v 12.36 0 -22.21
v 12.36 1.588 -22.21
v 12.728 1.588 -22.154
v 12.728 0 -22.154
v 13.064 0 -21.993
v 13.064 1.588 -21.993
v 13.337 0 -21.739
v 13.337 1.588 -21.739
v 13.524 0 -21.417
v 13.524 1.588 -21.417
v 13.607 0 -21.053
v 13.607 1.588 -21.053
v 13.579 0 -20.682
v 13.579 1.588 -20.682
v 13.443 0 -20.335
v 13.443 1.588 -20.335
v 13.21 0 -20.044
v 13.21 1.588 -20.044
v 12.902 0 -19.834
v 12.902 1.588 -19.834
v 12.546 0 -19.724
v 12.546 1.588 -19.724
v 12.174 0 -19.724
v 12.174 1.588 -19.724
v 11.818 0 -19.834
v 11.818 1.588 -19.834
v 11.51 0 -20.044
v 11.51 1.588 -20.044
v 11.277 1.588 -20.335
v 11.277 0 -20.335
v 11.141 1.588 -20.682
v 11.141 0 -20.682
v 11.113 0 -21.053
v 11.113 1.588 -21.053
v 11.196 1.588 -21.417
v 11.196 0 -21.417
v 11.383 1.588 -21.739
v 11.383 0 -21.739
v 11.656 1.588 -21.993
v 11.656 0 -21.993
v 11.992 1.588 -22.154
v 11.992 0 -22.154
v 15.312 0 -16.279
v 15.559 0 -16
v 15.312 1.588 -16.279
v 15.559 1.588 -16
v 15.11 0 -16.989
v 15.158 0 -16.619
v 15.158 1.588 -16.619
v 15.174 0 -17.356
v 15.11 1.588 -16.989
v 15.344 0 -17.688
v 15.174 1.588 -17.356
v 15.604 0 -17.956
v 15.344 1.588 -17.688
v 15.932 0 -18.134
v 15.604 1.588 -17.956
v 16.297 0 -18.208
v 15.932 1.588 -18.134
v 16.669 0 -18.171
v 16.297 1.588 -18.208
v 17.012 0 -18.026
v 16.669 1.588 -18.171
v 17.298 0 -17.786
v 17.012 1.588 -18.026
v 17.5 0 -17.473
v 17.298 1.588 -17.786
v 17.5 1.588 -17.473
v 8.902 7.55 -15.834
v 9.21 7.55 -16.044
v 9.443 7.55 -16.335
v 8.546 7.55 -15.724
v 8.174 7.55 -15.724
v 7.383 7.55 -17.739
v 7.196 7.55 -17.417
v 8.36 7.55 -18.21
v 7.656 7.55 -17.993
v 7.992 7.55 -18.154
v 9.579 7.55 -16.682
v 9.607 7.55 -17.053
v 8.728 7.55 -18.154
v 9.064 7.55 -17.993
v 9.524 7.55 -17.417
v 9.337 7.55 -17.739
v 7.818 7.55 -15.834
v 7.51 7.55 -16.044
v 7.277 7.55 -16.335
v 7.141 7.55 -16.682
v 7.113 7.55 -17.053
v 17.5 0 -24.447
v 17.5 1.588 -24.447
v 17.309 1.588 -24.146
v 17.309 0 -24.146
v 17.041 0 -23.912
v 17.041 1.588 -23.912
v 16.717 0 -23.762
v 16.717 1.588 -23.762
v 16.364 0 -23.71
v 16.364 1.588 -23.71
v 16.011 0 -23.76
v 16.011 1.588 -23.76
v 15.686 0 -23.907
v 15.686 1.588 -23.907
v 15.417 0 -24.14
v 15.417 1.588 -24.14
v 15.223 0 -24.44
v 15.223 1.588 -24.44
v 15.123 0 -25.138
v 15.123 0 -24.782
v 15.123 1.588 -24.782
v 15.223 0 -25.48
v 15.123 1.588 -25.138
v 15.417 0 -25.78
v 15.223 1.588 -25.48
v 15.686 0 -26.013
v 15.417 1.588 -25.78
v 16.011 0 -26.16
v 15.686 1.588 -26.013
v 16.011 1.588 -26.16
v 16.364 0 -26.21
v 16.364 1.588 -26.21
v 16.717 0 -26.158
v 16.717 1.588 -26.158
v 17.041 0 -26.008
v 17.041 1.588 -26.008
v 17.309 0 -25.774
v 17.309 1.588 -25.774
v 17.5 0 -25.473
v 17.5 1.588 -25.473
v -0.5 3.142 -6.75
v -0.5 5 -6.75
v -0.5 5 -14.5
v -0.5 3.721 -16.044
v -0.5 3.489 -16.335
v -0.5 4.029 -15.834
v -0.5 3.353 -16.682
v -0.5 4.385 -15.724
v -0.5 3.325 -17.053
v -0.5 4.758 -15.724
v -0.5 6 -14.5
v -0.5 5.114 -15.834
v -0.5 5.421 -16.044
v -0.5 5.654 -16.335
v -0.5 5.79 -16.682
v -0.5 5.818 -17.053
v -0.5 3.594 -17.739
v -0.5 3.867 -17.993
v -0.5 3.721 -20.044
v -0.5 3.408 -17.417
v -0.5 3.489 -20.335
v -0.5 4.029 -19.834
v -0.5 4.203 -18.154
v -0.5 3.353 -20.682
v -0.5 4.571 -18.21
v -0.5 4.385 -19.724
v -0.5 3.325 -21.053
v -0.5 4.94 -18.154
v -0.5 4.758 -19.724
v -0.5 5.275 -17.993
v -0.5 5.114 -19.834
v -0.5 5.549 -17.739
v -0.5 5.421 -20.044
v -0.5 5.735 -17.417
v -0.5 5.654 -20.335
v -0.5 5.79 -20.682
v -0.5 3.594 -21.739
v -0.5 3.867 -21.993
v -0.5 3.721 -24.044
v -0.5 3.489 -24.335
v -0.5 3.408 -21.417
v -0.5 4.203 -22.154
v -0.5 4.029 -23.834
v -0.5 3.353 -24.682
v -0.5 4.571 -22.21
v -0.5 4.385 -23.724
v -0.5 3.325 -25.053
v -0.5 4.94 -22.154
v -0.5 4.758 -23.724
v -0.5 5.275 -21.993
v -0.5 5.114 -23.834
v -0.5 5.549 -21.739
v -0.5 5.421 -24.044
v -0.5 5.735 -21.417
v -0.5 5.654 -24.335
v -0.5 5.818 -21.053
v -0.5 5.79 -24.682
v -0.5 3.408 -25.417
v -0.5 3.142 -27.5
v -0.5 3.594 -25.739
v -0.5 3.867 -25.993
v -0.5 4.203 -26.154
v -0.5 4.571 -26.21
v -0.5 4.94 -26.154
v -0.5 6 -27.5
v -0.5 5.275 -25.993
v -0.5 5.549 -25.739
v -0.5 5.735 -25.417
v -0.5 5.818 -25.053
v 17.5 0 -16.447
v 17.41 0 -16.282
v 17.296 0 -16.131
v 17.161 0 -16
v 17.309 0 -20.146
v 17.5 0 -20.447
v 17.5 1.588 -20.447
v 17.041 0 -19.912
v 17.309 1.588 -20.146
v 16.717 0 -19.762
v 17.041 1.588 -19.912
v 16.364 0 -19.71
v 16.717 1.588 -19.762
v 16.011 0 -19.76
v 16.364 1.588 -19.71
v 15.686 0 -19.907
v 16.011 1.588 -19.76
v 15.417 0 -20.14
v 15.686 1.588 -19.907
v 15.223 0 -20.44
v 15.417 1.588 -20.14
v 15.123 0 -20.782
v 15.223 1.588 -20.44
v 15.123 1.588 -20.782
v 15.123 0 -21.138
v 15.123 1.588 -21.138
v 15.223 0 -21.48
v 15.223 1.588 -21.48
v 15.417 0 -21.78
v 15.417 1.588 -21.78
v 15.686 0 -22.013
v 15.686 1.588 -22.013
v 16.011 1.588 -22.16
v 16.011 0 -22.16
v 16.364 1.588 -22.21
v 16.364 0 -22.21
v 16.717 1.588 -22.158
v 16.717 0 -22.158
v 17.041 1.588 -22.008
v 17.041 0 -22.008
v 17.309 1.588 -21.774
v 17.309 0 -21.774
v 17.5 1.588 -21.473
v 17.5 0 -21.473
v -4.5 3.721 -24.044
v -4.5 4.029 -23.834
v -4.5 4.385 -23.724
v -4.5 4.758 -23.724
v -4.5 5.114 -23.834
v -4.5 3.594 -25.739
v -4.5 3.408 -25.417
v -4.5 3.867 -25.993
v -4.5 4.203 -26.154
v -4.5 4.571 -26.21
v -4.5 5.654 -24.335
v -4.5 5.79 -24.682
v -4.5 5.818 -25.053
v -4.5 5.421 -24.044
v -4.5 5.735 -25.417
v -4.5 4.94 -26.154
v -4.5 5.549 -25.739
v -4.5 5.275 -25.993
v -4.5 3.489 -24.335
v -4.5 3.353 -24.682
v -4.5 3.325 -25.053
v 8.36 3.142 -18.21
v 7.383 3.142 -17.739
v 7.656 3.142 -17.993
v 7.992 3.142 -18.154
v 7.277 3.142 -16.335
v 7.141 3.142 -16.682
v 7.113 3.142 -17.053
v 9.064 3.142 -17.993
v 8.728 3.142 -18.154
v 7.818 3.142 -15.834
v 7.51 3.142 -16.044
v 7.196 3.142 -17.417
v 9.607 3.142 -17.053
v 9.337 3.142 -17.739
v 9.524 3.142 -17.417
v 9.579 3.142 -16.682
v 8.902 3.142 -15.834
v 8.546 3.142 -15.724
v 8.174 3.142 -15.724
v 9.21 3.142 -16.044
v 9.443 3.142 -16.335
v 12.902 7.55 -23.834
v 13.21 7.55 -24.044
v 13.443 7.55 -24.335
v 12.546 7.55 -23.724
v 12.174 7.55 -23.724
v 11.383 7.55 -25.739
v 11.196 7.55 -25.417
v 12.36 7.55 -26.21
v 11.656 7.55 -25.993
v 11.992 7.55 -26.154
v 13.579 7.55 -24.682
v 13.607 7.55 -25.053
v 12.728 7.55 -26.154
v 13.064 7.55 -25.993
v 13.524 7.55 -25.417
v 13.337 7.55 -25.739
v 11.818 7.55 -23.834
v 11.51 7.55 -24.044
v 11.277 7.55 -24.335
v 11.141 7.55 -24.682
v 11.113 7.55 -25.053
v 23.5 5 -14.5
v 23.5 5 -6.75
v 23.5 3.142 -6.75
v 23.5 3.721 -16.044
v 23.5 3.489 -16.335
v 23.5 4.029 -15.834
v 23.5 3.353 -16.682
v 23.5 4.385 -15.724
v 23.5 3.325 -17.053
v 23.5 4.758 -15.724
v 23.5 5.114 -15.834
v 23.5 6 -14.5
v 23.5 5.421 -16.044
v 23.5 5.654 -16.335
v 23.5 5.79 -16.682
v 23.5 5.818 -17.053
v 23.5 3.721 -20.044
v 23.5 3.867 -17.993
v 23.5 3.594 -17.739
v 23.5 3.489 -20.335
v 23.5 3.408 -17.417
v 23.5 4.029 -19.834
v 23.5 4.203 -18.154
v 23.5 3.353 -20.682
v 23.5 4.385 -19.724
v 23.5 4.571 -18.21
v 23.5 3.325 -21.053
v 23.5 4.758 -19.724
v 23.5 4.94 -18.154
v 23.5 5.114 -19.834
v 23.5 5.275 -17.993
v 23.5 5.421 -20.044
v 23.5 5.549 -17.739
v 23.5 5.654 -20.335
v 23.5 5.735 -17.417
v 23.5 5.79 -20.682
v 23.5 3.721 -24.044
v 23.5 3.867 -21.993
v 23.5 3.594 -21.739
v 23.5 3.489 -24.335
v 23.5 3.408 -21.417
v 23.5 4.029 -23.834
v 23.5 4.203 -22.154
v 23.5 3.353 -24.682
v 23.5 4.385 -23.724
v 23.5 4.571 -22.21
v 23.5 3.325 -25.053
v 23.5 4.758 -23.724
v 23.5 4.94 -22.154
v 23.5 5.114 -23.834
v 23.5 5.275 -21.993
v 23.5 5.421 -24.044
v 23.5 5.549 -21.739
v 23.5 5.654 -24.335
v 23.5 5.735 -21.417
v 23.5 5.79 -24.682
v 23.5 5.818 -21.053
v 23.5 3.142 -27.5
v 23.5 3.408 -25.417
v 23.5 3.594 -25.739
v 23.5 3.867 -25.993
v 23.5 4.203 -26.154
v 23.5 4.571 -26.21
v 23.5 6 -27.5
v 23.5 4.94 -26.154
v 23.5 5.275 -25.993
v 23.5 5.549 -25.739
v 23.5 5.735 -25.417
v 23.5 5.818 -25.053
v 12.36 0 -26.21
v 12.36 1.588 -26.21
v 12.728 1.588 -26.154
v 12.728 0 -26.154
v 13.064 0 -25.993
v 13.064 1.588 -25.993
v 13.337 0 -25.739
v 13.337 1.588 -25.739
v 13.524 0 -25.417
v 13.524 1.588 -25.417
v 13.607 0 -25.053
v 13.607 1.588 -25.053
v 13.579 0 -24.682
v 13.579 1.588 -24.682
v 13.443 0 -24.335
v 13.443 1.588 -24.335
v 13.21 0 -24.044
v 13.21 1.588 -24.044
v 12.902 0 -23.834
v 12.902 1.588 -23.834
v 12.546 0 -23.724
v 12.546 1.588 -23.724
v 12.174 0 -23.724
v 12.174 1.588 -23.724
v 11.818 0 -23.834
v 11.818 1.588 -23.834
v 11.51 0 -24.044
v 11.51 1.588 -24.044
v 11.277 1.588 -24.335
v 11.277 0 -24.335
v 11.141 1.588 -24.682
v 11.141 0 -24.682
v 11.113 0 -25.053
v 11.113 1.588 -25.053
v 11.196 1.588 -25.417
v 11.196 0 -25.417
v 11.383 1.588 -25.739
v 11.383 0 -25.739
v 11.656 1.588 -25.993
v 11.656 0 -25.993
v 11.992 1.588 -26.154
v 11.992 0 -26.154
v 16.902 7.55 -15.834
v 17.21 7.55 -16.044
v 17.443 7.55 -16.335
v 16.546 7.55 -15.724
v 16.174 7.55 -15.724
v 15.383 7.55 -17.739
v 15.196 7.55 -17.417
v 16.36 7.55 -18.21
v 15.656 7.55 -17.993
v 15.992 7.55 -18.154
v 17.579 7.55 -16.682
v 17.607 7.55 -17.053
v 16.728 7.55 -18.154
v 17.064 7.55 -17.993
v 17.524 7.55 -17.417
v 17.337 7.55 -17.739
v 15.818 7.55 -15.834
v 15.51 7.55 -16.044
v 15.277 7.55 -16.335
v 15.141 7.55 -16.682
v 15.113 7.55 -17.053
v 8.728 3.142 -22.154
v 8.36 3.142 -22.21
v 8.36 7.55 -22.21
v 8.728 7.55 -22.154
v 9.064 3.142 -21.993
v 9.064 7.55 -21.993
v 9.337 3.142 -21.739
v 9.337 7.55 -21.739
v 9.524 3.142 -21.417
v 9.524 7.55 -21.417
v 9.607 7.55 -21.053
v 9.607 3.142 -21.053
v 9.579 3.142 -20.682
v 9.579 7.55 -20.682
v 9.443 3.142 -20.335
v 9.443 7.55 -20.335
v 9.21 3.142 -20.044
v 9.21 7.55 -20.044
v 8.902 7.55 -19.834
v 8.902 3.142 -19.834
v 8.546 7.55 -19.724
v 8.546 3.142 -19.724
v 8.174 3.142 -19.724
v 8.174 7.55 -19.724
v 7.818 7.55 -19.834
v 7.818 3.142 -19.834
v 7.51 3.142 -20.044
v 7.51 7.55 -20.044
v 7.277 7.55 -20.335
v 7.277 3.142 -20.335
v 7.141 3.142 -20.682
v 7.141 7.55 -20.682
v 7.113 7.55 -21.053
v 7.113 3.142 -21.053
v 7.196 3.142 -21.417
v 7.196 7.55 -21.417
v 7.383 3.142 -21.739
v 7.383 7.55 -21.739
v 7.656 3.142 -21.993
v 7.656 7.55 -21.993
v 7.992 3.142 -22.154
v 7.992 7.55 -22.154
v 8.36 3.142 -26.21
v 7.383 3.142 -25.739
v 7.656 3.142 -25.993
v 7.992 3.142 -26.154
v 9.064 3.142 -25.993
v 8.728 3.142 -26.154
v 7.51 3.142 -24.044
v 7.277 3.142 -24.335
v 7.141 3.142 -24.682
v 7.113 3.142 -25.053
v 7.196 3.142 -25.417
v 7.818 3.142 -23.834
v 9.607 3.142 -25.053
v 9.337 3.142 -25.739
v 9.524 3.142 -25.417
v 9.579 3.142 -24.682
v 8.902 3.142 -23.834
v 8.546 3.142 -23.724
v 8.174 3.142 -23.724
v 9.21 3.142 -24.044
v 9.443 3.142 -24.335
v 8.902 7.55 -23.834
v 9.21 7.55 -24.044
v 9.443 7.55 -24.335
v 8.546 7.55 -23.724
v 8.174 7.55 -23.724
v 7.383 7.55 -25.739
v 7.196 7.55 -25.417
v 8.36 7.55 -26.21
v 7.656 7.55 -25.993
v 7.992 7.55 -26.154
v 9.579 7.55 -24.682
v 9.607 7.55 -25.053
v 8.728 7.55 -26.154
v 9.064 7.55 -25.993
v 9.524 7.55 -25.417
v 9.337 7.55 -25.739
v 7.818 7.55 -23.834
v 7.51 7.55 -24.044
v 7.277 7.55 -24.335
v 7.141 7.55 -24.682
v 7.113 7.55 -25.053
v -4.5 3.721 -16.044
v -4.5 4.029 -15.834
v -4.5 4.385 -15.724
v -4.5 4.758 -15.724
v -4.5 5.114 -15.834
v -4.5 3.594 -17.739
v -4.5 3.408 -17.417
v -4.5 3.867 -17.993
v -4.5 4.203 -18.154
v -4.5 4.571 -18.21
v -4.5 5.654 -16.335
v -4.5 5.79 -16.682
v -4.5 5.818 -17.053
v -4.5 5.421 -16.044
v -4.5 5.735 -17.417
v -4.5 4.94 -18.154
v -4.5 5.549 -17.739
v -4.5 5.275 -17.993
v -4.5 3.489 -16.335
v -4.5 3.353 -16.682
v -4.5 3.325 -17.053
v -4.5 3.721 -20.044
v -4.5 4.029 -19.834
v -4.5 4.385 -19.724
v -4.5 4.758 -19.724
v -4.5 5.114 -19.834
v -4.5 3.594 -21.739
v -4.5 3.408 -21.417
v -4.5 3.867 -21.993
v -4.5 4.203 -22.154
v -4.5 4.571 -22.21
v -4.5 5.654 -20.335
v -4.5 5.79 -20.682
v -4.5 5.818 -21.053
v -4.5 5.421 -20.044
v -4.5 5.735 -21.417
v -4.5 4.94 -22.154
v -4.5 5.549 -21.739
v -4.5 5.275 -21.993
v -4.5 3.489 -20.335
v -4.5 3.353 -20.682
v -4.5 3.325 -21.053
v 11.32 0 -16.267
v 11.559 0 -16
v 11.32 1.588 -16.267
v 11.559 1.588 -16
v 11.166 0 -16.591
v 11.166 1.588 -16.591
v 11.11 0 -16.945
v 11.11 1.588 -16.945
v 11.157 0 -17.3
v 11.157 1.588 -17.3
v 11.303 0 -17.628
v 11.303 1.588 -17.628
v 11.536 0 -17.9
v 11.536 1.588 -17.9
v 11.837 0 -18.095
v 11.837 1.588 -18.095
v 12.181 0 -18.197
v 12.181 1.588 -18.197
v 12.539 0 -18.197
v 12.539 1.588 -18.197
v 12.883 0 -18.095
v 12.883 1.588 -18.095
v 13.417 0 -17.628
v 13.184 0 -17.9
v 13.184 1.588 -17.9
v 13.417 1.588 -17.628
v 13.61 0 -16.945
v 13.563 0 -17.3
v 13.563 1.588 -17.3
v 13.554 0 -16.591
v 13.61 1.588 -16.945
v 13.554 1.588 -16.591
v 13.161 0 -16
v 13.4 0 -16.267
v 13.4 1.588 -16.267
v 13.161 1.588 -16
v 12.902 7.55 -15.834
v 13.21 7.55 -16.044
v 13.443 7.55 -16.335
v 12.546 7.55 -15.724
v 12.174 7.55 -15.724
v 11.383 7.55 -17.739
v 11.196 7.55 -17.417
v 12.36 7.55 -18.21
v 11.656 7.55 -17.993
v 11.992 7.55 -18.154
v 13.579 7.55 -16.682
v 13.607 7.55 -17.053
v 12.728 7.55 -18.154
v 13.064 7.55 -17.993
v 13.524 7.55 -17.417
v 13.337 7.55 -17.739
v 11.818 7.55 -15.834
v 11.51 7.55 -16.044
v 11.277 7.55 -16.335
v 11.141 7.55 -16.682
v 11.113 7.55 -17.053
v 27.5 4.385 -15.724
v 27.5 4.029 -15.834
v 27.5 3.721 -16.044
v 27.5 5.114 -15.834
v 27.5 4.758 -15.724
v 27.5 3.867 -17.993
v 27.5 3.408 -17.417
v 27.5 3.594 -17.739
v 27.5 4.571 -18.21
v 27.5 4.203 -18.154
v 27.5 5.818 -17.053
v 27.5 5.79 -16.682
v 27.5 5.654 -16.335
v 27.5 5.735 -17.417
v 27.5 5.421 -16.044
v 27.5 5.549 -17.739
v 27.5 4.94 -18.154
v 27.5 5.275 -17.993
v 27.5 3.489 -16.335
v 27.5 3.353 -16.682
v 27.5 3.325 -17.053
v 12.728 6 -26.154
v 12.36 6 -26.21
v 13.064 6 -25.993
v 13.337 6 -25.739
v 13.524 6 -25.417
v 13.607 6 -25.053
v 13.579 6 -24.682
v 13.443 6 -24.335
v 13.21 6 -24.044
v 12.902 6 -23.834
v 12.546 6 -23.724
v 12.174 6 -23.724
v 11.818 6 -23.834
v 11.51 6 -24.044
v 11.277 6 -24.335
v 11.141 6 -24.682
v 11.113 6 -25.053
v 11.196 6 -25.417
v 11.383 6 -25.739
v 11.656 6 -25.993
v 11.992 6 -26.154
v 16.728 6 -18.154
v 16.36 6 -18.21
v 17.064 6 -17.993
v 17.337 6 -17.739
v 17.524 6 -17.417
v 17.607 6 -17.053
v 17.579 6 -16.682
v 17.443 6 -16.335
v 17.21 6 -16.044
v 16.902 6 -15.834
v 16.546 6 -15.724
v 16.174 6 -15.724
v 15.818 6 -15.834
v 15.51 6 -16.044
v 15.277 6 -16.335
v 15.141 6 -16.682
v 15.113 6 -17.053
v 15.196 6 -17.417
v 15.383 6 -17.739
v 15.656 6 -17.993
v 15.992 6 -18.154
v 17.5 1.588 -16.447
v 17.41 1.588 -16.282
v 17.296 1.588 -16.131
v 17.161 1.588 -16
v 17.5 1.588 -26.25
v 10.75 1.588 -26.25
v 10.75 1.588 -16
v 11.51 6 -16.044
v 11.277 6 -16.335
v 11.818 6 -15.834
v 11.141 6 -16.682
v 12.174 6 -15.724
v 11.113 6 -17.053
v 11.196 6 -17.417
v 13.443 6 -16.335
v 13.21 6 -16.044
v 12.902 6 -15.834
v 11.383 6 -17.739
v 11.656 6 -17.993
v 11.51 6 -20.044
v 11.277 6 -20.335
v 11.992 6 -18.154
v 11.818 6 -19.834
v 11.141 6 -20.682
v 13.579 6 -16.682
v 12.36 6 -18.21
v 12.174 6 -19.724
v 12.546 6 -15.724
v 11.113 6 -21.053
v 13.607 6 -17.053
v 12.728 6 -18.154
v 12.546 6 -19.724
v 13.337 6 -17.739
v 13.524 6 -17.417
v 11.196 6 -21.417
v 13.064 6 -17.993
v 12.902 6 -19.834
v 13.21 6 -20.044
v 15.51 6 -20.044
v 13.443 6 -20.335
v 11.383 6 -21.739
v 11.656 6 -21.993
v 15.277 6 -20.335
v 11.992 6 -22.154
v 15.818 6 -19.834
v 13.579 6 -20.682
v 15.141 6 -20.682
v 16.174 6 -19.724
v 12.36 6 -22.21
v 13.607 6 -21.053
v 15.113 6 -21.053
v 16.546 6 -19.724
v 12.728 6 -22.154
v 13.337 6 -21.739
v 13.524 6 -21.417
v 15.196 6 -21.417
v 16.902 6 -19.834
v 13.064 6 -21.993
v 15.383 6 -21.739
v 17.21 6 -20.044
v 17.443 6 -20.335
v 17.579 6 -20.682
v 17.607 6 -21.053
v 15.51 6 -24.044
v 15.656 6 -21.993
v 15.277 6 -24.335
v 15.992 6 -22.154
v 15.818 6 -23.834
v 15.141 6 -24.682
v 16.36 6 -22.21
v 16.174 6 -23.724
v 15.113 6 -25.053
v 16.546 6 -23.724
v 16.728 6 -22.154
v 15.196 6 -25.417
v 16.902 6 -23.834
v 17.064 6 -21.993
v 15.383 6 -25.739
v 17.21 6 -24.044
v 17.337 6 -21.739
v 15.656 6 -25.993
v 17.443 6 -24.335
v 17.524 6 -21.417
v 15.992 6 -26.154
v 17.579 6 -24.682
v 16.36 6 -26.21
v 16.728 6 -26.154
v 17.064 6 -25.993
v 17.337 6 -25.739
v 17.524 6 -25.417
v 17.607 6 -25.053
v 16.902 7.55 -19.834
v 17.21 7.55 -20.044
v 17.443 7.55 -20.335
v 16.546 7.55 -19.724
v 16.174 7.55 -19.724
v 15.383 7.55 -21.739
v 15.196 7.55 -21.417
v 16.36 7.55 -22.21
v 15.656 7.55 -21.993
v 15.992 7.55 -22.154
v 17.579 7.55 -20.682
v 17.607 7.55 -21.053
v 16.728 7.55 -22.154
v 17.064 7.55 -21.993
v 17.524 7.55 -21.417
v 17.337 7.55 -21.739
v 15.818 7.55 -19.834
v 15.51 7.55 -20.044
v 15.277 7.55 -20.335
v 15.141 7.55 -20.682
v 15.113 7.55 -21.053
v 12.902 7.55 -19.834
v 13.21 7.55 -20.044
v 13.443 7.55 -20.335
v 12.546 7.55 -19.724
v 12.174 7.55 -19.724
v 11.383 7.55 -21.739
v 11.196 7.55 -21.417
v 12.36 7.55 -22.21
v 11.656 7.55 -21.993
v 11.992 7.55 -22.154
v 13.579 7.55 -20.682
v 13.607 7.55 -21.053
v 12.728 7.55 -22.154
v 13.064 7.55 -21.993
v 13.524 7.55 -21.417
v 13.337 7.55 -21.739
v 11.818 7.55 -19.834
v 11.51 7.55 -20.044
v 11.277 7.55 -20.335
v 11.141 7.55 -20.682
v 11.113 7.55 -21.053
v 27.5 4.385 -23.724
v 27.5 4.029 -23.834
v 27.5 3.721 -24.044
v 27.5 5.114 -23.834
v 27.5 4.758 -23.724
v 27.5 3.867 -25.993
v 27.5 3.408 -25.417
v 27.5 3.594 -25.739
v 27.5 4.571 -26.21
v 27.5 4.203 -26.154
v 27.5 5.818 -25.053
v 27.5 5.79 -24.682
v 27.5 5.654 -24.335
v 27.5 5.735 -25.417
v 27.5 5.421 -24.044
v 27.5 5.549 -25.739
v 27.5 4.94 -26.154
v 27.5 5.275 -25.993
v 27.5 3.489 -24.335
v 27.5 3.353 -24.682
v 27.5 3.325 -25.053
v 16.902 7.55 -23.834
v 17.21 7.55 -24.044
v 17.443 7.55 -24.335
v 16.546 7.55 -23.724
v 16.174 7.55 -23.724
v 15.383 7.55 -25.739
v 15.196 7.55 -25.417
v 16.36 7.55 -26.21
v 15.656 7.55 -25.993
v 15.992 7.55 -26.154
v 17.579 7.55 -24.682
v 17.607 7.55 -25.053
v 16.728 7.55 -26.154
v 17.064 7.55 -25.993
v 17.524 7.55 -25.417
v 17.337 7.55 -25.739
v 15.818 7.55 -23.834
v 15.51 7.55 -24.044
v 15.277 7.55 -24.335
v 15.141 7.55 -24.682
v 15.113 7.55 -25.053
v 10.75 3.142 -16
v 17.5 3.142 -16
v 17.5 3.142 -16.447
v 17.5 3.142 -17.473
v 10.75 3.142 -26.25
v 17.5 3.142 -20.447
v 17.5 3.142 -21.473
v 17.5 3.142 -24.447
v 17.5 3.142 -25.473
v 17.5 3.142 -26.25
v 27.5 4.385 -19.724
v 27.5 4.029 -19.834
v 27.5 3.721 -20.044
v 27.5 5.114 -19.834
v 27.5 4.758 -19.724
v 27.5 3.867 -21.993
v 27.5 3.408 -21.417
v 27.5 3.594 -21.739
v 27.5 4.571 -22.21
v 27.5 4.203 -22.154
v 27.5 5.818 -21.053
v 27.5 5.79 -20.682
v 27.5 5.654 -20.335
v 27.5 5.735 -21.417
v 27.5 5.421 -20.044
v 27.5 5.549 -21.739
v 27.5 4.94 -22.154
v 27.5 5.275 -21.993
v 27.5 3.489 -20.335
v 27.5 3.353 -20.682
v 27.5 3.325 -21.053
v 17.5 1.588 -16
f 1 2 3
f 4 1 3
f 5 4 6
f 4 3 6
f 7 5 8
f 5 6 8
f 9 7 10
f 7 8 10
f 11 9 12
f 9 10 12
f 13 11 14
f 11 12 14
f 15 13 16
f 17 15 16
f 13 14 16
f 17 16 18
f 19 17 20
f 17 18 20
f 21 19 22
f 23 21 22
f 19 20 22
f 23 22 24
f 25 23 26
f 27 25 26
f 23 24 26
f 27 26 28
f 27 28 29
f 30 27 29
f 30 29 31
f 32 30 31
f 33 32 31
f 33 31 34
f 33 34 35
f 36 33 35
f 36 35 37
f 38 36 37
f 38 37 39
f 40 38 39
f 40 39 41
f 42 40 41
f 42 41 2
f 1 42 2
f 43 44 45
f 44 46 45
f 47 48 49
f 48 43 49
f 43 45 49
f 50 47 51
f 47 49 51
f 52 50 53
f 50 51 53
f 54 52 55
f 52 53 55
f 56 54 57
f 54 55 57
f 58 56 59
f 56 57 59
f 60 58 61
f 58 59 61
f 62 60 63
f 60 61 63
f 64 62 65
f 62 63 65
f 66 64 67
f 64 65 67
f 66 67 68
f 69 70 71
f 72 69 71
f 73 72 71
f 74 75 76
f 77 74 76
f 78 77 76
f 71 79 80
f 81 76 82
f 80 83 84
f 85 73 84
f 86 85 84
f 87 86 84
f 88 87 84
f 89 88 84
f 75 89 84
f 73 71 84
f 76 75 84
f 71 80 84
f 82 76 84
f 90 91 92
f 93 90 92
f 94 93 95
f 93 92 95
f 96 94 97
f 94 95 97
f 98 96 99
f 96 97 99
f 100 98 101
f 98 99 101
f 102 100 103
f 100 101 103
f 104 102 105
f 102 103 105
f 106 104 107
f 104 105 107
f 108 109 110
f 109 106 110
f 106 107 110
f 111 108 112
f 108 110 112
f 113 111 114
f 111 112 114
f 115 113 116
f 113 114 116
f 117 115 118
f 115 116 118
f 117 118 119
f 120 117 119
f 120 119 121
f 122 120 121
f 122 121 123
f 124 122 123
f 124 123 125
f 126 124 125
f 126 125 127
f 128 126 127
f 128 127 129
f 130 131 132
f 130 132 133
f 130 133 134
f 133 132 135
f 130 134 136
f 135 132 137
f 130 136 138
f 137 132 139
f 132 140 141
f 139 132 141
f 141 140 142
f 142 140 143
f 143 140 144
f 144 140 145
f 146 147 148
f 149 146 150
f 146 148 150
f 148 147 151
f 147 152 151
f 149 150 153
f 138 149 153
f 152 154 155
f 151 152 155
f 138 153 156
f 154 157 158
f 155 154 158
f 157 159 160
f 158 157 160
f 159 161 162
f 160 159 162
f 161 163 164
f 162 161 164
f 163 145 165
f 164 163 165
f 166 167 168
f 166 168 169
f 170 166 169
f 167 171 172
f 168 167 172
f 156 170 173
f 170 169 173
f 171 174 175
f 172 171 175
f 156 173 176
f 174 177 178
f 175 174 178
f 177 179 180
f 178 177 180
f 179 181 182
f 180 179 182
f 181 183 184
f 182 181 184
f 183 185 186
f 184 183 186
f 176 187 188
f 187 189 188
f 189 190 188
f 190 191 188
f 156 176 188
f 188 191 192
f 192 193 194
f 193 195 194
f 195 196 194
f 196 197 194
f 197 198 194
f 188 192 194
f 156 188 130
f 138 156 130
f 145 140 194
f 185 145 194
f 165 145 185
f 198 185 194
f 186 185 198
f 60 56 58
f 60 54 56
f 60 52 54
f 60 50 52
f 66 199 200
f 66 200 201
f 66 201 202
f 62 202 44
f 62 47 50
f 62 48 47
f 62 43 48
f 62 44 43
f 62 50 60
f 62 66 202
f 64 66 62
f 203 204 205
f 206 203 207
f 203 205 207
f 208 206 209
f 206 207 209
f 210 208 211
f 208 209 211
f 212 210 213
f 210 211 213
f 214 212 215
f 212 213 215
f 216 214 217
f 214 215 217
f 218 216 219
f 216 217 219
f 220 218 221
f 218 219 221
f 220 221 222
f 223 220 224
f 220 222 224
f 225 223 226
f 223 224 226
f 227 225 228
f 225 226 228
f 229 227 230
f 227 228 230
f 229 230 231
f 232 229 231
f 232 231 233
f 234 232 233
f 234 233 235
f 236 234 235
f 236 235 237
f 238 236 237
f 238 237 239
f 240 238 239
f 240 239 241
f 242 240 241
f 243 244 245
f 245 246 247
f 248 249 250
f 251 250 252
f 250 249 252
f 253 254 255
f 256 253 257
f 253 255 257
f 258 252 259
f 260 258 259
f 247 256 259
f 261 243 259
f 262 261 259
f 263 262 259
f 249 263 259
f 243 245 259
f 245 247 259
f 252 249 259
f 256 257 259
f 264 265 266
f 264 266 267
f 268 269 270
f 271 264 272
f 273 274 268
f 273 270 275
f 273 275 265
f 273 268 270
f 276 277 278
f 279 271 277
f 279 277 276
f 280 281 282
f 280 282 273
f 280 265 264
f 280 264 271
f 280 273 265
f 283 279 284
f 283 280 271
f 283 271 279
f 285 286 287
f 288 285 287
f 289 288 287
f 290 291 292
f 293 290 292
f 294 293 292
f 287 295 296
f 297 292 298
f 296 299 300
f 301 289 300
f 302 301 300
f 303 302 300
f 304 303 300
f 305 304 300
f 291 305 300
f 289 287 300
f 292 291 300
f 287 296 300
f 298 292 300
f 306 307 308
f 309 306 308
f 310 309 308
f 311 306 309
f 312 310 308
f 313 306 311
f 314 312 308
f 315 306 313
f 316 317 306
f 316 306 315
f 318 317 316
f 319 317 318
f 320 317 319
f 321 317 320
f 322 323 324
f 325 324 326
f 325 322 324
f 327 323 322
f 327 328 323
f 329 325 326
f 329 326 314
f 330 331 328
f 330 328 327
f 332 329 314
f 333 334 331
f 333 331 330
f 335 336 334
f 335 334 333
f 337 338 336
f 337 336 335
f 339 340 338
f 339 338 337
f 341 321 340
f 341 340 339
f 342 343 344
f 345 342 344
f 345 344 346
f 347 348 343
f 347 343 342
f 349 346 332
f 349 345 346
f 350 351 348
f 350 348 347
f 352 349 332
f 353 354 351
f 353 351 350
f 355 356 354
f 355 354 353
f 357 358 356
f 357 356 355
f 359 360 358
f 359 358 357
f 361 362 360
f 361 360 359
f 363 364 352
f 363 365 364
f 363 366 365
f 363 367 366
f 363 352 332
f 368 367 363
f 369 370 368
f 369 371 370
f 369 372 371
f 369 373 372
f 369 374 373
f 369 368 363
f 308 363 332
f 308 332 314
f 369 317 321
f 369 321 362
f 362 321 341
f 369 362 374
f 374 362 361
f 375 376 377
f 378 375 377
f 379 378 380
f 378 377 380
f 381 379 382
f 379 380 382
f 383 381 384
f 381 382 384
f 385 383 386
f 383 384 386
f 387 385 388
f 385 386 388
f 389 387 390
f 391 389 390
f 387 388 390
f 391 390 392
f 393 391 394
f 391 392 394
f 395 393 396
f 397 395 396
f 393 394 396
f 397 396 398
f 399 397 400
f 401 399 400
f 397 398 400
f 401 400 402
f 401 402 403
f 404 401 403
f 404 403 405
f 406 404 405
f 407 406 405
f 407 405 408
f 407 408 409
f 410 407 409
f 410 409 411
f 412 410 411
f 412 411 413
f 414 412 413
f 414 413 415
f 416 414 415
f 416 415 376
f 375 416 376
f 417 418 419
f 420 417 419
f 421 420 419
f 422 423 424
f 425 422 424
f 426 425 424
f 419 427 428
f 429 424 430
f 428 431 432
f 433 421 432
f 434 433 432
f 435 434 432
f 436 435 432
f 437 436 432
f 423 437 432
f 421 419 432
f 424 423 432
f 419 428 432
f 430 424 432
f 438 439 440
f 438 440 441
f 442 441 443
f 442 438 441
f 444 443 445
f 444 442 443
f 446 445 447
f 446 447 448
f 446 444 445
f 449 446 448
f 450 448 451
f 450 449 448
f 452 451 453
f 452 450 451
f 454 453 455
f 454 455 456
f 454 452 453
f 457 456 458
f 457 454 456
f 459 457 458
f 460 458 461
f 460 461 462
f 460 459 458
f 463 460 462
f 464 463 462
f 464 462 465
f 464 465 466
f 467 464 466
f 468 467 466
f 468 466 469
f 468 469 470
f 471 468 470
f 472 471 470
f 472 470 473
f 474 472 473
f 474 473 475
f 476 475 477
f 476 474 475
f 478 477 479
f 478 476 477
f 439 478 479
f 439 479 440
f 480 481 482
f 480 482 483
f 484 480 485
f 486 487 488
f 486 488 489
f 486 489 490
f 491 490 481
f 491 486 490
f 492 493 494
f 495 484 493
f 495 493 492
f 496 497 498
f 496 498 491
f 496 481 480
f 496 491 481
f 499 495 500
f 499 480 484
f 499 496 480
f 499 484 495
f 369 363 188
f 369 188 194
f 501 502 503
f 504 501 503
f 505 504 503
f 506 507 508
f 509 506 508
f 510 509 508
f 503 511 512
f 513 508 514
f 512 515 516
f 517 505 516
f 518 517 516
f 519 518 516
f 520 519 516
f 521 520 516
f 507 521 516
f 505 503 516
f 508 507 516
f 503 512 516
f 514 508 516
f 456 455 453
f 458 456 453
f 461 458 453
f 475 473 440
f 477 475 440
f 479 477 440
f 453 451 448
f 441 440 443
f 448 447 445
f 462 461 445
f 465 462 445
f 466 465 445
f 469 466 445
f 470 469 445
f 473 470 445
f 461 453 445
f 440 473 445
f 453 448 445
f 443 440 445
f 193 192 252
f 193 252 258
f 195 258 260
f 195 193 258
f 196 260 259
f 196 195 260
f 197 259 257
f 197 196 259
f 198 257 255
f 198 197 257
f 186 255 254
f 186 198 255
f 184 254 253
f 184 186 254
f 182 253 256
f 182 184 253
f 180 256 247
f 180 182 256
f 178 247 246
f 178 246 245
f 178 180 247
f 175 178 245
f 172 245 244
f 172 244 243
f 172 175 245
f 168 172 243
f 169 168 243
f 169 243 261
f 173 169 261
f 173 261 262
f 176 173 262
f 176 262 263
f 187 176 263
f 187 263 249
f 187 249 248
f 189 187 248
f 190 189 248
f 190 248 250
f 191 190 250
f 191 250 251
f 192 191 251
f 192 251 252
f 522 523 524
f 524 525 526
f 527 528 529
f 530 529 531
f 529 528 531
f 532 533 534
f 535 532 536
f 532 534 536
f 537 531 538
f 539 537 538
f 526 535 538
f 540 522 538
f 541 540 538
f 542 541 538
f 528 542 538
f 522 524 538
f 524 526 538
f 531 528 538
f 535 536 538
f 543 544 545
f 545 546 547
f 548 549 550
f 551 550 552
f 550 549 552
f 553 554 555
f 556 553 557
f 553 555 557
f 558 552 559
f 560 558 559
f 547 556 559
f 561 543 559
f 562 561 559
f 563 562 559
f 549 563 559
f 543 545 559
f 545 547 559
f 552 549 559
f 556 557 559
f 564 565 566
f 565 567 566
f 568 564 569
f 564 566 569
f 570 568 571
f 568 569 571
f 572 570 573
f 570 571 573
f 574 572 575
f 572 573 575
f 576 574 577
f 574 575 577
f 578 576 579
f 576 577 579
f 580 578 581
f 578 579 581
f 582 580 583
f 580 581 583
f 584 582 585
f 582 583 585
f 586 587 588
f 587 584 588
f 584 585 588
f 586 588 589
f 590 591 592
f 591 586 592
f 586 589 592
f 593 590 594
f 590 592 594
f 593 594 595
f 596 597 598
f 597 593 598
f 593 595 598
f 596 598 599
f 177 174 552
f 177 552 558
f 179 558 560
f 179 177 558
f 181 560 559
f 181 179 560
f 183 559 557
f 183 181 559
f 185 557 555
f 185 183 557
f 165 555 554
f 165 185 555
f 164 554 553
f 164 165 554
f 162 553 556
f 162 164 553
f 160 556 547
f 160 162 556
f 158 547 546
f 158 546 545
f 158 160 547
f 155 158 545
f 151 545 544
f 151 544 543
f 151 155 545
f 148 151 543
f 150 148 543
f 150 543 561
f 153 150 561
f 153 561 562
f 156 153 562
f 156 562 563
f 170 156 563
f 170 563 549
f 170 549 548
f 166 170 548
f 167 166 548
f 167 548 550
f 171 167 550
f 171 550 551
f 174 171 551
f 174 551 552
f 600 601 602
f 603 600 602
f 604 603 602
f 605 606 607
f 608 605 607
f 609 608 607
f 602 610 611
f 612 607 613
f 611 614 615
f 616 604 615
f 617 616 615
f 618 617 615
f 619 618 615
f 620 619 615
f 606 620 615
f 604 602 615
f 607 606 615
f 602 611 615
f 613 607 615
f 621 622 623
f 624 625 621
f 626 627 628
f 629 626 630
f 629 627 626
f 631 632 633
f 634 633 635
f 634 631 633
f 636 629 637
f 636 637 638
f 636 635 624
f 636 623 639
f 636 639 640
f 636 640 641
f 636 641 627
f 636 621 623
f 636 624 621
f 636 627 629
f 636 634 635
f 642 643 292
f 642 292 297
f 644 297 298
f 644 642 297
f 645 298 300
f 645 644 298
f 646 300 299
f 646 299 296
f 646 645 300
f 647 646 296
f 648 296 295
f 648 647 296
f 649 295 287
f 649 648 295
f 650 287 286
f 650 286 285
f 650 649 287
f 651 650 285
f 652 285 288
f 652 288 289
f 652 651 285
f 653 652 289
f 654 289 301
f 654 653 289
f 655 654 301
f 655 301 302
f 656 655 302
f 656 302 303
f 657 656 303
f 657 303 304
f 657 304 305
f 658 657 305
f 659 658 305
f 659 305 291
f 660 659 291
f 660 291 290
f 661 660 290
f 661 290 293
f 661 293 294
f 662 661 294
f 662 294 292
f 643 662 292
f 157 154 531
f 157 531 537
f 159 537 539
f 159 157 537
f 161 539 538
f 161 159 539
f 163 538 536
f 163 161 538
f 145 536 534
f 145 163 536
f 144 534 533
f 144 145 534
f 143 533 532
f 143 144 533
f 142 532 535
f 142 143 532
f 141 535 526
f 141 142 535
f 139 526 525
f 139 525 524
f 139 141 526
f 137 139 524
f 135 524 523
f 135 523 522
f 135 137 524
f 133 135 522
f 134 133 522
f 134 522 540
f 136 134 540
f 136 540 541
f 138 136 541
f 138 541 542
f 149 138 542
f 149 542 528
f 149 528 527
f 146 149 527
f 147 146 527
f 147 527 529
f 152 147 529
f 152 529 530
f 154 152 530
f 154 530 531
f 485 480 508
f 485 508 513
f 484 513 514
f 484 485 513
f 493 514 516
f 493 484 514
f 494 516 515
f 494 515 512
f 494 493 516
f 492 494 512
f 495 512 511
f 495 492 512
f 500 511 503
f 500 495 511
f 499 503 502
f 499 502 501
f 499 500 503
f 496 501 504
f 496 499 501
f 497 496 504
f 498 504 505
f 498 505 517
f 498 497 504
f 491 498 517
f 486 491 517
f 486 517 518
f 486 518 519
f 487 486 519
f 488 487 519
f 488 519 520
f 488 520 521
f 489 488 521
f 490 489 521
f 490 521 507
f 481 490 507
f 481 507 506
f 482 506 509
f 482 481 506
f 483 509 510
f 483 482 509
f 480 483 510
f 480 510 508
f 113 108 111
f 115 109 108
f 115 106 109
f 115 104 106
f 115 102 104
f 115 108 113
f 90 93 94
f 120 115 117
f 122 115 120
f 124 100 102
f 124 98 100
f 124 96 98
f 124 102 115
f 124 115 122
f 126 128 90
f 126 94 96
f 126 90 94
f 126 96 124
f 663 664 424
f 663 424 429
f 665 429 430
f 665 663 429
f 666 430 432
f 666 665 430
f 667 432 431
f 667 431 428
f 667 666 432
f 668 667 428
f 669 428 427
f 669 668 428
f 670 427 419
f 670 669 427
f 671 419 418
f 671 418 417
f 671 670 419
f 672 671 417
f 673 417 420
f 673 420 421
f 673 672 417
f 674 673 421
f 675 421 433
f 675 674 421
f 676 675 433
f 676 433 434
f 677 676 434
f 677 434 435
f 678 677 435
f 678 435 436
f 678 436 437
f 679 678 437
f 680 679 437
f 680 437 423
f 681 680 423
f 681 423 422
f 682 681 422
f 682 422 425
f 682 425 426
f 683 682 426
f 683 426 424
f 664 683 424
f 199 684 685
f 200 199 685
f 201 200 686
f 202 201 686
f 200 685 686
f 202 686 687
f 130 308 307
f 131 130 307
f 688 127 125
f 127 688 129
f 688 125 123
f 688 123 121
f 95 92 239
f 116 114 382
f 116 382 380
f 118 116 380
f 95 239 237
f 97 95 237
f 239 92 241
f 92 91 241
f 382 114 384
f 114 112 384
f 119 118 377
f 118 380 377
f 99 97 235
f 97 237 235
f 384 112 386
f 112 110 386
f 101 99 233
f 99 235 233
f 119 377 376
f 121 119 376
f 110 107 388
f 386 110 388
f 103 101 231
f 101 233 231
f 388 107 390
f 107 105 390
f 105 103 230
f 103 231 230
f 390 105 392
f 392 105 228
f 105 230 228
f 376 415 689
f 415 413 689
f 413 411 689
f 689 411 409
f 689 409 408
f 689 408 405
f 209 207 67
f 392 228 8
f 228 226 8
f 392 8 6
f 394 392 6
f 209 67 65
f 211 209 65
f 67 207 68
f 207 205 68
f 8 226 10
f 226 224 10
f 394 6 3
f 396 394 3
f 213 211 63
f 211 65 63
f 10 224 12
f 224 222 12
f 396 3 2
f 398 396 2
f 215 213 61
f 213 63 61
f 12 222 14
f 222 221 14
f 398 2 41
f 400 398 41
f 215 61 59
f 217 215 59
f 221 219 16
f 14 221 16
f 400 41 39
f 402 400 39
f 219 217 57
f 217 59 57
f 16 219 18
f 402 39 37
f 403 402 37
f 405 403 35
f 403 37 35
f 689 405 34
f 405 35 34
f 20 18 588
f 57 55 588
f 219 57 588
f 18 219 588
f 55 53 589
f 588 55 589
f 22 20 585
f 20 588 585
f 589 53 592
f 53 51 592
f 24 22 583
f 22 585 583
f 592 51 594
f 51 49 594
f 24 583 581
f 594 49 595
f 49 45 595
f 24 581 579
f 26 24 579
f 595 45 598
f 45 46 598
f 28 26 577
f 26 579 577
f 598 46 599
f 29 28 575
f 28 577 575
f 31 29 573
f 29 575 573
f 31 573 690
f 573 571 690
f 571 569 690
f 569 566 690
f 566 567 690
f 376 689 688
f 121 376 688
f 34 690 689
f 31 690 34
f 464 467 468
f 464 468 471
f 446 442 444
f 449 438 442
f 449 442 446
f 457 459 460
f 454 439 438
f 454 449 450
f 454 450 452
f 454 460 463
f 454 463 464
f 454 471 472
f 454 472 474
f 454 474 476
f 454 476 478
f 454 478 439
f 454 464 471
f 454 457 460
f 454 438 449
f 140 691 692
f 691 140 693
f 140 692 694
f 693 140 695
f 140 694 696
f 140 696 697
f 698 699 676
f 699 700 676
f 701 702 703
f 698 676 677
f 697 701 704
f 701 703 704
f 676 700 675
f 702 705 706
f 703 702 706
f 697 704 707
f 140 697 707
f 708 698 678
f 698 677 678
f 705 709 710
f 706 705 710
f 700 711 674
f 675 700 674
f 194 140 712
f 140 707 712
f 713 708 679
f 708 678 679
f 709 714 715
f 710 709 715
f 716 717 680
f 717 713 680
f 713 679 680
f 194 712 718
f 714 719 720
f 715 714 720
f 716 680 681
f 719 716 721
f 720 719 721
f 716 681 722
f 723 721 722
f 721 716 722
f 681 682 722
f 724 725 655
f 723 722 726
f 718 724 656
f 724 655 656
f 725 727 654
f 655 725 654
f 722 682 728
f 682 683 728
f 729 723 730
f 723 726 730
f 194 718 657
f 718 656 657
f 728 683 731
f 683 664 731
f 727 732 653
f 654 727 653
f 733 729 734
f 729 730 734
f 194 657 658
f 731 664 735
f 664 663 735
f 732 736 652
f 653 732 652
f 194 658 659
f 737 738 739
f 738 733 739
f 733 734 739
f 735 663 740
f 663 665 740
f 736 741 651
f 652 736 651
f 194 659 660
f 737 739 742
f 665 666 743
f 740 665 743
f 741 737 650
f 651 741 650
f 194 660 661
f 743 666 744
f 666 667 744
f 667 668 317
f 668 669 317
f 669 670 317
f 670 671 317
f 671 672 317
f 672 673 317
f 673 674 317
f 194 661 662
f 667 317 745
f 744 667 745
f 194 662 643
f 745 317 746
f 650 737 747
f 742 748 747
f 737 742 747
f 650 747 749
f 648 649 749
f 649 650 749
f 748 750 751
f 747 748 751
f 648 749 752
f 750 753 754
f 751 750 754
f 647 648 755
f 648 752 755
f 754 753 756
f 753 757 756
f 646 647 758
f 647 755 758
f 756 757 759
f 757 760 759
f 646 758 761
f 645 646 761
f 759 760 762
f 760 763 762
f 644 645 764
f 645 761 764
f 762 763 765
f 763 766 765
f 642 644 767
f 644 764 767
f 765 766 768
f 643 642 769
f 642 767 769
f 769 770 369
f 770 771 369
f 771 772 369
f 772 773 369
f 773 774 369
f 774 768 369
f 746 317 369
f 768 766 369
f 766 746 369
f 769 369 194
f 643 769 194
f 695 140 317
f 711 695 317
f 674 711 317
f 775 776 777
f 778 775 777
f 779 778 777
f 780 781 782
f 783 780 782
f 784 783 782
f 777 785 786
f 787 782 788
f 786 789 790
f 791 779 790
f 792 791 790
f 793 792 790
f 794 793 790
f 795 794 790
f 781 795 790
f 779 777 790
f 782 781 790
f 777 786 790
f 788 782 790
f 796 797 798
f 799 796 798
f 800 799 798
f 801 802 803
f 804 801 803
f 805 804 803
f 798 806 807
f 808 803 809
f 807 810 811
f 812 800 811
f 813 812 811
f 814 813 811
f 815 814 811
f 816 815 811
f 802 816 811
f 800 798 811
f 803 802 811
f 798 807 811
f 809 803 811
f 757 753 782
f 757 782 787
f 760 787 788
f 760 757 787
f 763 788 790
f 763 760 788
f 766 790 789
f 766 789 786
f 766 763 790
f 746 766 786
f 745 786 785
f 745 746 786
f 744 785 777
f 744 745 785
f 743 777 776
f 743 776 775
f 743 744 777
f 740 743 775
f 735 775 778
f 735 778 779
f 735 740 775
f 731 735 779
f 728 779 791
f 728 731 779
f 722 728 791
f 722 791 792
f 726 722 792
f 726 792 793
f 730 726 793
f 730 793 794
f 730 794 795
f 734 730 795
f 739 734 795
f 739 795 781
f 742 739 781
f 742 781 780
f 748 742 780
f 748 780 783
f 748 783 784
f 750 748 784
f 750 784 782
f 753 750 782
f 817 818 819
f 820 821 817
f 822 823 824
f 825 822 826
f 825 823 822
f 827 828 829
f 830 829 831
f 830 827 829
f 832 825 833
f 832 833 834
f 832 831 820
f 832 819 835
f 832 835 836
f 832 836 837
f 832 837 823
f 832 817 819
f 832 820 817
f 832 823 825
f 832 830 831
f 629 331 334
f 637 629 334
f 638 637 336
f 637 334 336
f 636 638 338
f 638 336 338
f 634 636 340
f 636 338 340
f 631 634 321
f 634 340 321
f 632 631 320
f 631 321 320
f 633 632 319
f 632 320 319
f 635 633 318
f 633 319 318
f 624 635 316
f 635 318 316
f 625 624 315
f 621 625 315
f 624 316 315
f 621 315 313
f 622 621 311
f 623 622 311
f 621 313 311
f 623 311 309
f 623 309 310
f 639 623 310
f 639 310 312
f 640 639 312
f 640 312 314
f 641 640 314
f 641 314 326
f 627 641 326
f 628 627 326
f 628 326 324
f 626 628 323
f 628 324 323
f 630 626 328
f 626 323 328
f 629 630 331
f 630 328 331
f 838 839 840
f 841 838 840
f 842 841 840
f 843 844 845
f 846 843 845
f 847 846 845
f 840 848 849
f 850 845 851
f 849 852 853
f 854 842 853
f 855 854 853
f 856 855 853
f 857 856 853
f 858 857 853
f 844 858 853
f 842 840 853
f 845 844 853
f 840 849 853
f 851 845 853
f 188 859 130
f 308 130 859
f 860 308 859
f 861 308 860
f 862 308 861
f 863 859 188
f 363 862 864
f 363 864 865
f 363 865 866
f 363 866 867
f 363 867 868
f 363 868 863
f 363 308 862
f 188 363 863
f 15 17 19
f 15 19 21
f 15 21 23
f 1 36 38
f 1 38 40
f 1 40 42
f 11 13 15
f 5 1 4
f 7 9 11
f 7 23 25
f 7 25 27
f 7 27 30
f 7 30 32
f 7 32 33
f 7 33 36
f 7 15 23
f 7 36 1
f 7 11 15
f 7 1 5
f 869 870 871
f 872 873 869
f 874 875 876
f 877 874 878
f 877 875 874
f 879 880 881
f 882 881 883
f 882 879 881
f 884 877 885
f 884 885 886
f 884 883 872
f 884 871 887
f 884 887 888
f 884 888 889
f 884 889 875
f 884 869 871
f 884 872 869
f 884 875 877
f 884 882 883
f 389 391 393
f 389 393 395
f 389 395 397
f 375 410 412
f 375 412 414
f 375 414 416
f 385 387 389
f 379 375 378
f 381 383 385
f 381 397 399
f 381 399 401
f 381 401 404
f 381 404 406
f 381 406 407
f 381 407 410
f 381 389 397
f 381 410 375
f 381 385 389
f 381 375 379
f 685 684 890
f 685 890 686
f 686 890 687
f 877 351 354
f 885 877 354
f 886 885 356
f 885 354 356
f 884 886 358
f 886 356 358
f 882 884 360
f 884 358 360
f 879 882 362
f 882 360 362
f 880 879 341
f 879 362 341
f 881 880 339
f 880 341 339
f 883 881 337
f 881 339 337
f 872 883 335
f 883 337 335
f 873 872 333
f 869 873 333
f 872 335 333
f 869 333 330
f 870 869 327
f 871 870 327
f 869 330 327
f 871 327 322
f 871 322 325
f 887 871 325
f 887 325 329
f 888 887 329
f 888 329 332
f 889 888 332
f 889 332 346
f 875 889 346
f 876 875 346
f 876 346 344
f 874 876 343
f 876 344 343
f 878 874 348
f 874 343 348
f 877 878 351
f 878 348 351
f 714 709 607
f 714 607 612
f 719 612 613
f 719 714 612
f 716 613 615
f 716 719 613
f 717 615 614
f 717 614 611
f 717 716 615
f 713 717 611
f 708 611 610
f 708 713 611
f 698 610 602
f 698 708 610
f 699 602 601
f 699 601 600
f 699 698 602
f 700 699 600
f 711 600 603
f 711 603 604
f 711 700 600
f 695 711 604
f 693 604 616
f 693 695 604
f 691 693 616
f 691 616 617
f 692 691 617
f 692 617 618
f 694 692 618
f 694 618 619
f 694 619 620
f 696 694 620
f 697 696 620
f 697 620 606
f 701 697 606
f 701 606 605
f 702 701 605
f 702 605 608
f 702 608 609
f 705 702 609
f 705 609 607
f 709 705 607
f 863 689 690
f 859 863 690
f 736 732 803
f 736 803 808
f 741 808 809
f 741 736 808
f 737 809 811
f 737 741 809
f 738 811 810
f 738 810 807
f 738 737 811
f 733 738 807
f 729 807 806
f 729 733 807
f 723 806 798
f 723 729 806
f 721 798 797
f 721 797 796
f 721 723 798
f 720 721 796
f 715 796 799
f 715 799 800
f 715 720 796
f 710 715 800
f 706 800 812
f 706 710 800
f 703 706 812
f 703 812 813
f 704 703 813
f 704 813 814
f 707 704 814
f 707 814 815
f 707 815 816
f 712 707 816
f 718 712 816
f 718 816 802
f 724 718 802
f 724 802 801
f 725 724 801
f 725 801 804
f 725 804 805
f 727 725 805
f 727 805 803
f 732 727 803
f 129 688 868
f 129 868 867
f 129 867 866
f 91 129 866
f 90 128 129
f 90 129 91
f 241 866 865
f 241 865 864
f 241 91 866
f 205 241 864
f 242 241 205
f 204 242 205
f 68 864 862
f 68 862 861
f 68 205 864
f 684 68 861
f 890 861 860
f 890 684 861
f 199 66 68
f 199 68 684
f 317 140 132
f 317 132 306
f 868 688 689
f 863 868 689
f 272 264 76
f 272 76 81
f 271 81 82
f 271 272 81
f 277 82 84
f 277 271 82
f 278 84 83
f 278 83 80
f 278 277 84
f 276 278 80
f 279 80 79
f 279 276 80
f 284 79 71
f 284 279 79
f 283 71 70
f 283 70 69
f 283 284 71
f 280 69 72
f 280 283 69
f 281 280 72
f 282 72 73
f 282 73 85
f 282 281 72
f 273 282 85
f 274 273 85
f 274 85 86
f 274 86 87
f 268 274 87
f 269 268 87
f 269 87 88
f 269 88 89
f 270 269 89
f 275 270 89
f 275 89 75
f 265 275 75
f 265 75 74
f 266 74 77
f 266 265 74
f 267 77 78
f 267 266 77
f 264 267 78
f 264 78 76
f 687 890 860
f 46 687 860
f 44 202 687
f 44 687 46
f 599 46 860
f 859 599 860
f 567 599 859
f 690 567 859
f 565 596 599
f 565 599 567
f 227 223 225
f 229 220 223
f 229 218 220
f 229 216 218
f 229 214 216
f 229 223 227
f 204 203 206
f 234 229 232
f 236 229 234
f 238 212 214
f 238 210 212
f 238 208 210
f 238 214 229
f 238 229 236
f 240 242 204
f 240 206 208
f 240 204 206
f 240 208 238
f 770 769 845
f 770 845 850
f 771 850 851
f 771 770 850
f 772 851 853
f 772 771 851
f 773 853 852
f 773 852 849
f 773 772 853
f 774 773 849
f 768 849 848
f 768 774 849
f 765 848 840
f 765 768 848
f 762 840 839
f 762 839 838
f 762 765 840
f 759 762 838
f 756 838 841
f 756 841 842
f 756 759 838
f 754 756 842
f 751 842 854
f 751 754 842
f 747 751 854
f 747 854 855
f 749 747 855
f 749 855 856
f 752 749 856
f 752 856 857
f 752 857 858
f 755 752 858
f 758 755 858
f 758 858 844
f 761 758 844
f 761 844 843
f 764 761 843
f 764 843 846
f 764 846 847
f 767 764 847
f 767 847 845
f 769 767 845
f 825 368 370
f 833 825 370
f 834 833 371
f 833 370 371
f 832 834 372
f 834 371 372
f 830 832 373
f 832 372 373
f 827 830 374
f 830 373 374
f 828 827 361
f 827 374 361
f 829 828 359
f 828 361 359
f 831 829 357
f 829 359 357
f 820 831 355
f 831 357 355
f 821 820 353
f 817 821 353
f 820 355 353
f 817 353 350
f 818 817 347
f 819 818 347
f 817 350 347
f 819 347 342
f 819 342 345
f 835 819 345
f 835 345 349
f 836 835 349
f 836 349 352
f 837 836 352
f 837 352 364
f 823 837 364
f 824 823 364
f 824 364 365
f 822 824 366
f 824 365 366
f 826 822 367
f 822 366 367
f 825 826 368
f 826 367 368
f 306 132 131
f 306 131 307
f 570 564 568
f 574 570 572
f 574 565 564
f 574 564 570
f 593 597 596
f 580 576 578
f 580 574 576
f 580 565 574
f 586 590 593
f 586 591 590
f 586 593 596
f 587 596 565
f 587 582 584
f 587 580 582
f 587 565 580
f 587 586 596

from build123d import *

# Parameters (mm, degrees)
SKETCH3_W                = 6.75
SKETCH3_H                = 10.25
BOSS_EXTRUDE2_DEPTH      = 4.4125
SKETCH5_R                = 1.25
BOSS_EXTRUDE3_DEPTH      = 3.1375
BOSS_EXTRUDE3_DEPTH_BACK = 4.4125
SKETCH6_W                = 20.75
SKETCH6_H                = 2.8575
BOSS_EXTRUDE4_DEPTH      = 6
BOSS_EXTRUDE4_DEPTH_BACK = 18
SKETCH11_W               = 4.903668723
SKETCH11_H               = 13.795083936
CUT_EXTRUDE1_DEPTH       = 4.1425
SKETCH12_W               = 24.809843128
SKETCH12_H               = 8.769619276
CUT_EXTRUDE2_DEPTH       = 1
SKETCH13_R               = 1.25
BOSS_EXTRUDE8_DEPTH      = 4
BOSS_EXTRUDE8_DEPTH_BACK = 28
SKETCH14_W               = 7.412722891
SKETCH14_H               = 4.260464904
CUT_EXTRUDE3_DEPTH       = 1.5
SKETCH15_W               = 10.923147027
SKETCH15_H               = 4.163362597
CUT_EXTRUDE4_DEPTH       = 0.11


with BuildPart() as part:
    # Sketch3 → Boss-Extrude2 (new body)
    with BuildSketch(Plane(origin=(0, 1.5875, 0), x_dir=(-1, 0, 0), z_dir=(0, 1, 0))):
        with Locations((-14.125, -21.125)):
            Rectangle(SKETCH3_W, SKETCH3_H)
    extrude(amount=BOSS_EXTRUDE2_DEPTH)

    # Sketch5 → Boss-Extrude3 (add, two sides)
    with BuildSketch(Plane.XZ.offset(-3.1375)) as boss_extrude3_sk:
        with Locations(Location((16.36, -24.96, 0), (0, 0, 270))):
            Circle(SKETCH5_R)
        with Locations(Location((12.36, -24.96, 0), (0, 0, 270))):
            Circle(SKETCH5_R)
        with Locations(Location((8.36, -24.96, 0), (0, 0, 270))):
            Circle(SKETCH5_R)
        with Locations(Location((16.36, -20.96, 0), (0, 0, 270))):
            Circle(SKETCH5_R)
        with Locations(Location((12.36, -20.96, 0), (0, 0, 270))):
            Circle(SKETCH5_R)
        with Locations(Location((8.36, -20.96, 0), (0, 0, 270))):
            Circle(SKETCH5_R)
        with Locations(Location((16.36, -16.96, 0), (0, 0, 270))):
            Circle(SKETCH5_R)
        with Locations(Location((12.36, -16.96, 0), (0, 0, 270))):
            Circle(SKETCH5_R)
        with Locations(Location((8.36, -16.96, 0), (0, 0, 270))):
            Circle(SKETCH5_R)
    extrude(amount=BOSS_EXTRUDE3_DEPTH)
    extrude(boss_extrude3_sk.sketch, amount=-BOSS_EXTRUDE3_DEPTH_BACK)


with BuildPart() as boss_extrude3_piece_1:
    # of the separate pieces the step leaves, piece 1, a body of its own (boss_extrude3_pieces)
    add(part.part.solids().sort_by_distance((10.75, 1.5875, -16))[0])

    # Sketch6 → Boss-Extrude4 (add, two sides)
    with BuildSketch(Plane(origin=(17.5, 0, 0), x_dir=(0, 0, -1), z_dir=(1, 0, 0))) as boss_extrude4_sk:
        with Locations((17.125, 4.57125)):
            Rectangle(SKETCH6_W, SKETCH6_H)
    extrude(amount=BOSS_EXTRUDE4_DEPTH)
    extrude(boss_extrude4_sk.sketch, amount=-BOSS_EXTRUDE4_DEPTH_BACK)

    # Sketch12 → Cut-Extrude2 (cut)
    with BuildSketch(Plane(origin=(0, 6, 0), x_dir=(1, 0, 0), z_dir=(0, 1, 0))):
        with Locations((11.41674784, 10.115190362)):
            Rectangle(SKETCH12_W, SKETCH12_H)
    extrude(amount=-CUT_EXTRUDE2_DEPTH, mode=Mode.SUBTRACT)

    # Sketch13 → Boss-Extrude8 (add, two sides)
    with BuildSketch(Plane(origin=(23.5, 0, 0), x_dir=(0, 0, -1), z_dir=(1, 0, 0))) as boss_extrude8_sk:
        with Locations((24.96, 4.57125)):
            Circle(SKETCH13_R)
        with Locations((16.96, 4.57125)):
            Circle(SKETCH13_R)
        with Locations((20.96, 4.57125)):
            Circle(SKETCH13_R)
    extrude(amount=BOSS_EXTRUDE8_DEPTH)
    extrude(boss_extrude8_sk.sketch, amount=-BOSS_EXTRUDE8_DEPTH_BACK)

    # Sketch14 → Cut-Extrude3 (cut)
    with BuildSketch(Plane.XY.offset(-16)):
        with Locations((14.456361446, 1.012267548)):
            Rectangle(SKETCH14_W, SKETCH14_H)
    extrude(amount=CUT_EXTRUDE3_DEPTH, mode=Mode.SUBTRACT)

    # Sketch15 → Cut-Extrude4 (cut)
    with BuildSketch(Plane(origin=(17.5, 0, 0), x_dir=(0, 0, -1), z_dir=(1, 0, 0))):
        with Locations((21.461573513, 1.060818702)):
            Rectangle(SKETCH15_W, SKETCH15_H)
    extrude(amount=CUT_EXTRUDE4_DEPTH, mode=Mode.SUBTRACT)


with BuildPart() as boss_extrude3_piece_2:
    # of the separate pieces the step leaves, piece 2, a body of its own (boss_extrude3_pieces)
    add(part.part.solids().sort_by_distance((8.36, 3.1375, -26.21))[0])


with BuildPart() as boss_extrude3_piece_3:
    # of the separate pieces the step leaves, piece 3, a body of its own (boss_extrude3_pieces)
    add(part.part.solids().sort_by_distance((8.36, 3.1375, -22.21))[0])


with BuildPart() as boss_extrude3_piece_4:
    # of the separate pieces the step leaves, piece 4, a body of its own (boss_extrude3_pieces)
    add(part.part.solids().sort_by_distance((8.36, 3.1375, -18.21))[0])


with BuildPart() as cut_extrude1_tool:
    # Sketch11 → Cut-Extrude1 (new body)
    with BuildSketch(Plane.XZ.offset(-3.1425)):
        with Locations((7.758670905, -20.928761162)):
            Rectangle(SKETCH11_W, SKETCH11_H)
    extrude(amount=CUT_EXTRUDE1_DEPTH)


with BuildPart() as boss_extrude3_piece_2_1:
    add(boss_extrude3_piece_2.part)

    # Cut-Extrude1: cut by cut_extrude1_tool
    add(cut_extrude1_tool.part, mode=Mode.SUBTRACT)


with BuildPart() as boss_extrude3_piece_3_1:
    add(boss_extrude3_piece_3.part)

    # Cut-Extrude1: cut by cut_extrude1_tool
    add(cut_extrude1_tool.part, mode=Mode.SUBTRACT)


with BuildPart() as boss_extrude3_piece_4_1:
    add(boss_extrude3_piece_4.part)

    # Cut-Extrude1: cut by cut_extrude1_tool
    add(cut_extrude1_tool.part, mode=Mode.SUBTRACT)


solid = Compound([boss_extrude3_piece_1.part, boss_extrude3_piece_2_1.part, boss_extrude3_piece_3_1.part, boss_extrude3_piece_4_1.part])
